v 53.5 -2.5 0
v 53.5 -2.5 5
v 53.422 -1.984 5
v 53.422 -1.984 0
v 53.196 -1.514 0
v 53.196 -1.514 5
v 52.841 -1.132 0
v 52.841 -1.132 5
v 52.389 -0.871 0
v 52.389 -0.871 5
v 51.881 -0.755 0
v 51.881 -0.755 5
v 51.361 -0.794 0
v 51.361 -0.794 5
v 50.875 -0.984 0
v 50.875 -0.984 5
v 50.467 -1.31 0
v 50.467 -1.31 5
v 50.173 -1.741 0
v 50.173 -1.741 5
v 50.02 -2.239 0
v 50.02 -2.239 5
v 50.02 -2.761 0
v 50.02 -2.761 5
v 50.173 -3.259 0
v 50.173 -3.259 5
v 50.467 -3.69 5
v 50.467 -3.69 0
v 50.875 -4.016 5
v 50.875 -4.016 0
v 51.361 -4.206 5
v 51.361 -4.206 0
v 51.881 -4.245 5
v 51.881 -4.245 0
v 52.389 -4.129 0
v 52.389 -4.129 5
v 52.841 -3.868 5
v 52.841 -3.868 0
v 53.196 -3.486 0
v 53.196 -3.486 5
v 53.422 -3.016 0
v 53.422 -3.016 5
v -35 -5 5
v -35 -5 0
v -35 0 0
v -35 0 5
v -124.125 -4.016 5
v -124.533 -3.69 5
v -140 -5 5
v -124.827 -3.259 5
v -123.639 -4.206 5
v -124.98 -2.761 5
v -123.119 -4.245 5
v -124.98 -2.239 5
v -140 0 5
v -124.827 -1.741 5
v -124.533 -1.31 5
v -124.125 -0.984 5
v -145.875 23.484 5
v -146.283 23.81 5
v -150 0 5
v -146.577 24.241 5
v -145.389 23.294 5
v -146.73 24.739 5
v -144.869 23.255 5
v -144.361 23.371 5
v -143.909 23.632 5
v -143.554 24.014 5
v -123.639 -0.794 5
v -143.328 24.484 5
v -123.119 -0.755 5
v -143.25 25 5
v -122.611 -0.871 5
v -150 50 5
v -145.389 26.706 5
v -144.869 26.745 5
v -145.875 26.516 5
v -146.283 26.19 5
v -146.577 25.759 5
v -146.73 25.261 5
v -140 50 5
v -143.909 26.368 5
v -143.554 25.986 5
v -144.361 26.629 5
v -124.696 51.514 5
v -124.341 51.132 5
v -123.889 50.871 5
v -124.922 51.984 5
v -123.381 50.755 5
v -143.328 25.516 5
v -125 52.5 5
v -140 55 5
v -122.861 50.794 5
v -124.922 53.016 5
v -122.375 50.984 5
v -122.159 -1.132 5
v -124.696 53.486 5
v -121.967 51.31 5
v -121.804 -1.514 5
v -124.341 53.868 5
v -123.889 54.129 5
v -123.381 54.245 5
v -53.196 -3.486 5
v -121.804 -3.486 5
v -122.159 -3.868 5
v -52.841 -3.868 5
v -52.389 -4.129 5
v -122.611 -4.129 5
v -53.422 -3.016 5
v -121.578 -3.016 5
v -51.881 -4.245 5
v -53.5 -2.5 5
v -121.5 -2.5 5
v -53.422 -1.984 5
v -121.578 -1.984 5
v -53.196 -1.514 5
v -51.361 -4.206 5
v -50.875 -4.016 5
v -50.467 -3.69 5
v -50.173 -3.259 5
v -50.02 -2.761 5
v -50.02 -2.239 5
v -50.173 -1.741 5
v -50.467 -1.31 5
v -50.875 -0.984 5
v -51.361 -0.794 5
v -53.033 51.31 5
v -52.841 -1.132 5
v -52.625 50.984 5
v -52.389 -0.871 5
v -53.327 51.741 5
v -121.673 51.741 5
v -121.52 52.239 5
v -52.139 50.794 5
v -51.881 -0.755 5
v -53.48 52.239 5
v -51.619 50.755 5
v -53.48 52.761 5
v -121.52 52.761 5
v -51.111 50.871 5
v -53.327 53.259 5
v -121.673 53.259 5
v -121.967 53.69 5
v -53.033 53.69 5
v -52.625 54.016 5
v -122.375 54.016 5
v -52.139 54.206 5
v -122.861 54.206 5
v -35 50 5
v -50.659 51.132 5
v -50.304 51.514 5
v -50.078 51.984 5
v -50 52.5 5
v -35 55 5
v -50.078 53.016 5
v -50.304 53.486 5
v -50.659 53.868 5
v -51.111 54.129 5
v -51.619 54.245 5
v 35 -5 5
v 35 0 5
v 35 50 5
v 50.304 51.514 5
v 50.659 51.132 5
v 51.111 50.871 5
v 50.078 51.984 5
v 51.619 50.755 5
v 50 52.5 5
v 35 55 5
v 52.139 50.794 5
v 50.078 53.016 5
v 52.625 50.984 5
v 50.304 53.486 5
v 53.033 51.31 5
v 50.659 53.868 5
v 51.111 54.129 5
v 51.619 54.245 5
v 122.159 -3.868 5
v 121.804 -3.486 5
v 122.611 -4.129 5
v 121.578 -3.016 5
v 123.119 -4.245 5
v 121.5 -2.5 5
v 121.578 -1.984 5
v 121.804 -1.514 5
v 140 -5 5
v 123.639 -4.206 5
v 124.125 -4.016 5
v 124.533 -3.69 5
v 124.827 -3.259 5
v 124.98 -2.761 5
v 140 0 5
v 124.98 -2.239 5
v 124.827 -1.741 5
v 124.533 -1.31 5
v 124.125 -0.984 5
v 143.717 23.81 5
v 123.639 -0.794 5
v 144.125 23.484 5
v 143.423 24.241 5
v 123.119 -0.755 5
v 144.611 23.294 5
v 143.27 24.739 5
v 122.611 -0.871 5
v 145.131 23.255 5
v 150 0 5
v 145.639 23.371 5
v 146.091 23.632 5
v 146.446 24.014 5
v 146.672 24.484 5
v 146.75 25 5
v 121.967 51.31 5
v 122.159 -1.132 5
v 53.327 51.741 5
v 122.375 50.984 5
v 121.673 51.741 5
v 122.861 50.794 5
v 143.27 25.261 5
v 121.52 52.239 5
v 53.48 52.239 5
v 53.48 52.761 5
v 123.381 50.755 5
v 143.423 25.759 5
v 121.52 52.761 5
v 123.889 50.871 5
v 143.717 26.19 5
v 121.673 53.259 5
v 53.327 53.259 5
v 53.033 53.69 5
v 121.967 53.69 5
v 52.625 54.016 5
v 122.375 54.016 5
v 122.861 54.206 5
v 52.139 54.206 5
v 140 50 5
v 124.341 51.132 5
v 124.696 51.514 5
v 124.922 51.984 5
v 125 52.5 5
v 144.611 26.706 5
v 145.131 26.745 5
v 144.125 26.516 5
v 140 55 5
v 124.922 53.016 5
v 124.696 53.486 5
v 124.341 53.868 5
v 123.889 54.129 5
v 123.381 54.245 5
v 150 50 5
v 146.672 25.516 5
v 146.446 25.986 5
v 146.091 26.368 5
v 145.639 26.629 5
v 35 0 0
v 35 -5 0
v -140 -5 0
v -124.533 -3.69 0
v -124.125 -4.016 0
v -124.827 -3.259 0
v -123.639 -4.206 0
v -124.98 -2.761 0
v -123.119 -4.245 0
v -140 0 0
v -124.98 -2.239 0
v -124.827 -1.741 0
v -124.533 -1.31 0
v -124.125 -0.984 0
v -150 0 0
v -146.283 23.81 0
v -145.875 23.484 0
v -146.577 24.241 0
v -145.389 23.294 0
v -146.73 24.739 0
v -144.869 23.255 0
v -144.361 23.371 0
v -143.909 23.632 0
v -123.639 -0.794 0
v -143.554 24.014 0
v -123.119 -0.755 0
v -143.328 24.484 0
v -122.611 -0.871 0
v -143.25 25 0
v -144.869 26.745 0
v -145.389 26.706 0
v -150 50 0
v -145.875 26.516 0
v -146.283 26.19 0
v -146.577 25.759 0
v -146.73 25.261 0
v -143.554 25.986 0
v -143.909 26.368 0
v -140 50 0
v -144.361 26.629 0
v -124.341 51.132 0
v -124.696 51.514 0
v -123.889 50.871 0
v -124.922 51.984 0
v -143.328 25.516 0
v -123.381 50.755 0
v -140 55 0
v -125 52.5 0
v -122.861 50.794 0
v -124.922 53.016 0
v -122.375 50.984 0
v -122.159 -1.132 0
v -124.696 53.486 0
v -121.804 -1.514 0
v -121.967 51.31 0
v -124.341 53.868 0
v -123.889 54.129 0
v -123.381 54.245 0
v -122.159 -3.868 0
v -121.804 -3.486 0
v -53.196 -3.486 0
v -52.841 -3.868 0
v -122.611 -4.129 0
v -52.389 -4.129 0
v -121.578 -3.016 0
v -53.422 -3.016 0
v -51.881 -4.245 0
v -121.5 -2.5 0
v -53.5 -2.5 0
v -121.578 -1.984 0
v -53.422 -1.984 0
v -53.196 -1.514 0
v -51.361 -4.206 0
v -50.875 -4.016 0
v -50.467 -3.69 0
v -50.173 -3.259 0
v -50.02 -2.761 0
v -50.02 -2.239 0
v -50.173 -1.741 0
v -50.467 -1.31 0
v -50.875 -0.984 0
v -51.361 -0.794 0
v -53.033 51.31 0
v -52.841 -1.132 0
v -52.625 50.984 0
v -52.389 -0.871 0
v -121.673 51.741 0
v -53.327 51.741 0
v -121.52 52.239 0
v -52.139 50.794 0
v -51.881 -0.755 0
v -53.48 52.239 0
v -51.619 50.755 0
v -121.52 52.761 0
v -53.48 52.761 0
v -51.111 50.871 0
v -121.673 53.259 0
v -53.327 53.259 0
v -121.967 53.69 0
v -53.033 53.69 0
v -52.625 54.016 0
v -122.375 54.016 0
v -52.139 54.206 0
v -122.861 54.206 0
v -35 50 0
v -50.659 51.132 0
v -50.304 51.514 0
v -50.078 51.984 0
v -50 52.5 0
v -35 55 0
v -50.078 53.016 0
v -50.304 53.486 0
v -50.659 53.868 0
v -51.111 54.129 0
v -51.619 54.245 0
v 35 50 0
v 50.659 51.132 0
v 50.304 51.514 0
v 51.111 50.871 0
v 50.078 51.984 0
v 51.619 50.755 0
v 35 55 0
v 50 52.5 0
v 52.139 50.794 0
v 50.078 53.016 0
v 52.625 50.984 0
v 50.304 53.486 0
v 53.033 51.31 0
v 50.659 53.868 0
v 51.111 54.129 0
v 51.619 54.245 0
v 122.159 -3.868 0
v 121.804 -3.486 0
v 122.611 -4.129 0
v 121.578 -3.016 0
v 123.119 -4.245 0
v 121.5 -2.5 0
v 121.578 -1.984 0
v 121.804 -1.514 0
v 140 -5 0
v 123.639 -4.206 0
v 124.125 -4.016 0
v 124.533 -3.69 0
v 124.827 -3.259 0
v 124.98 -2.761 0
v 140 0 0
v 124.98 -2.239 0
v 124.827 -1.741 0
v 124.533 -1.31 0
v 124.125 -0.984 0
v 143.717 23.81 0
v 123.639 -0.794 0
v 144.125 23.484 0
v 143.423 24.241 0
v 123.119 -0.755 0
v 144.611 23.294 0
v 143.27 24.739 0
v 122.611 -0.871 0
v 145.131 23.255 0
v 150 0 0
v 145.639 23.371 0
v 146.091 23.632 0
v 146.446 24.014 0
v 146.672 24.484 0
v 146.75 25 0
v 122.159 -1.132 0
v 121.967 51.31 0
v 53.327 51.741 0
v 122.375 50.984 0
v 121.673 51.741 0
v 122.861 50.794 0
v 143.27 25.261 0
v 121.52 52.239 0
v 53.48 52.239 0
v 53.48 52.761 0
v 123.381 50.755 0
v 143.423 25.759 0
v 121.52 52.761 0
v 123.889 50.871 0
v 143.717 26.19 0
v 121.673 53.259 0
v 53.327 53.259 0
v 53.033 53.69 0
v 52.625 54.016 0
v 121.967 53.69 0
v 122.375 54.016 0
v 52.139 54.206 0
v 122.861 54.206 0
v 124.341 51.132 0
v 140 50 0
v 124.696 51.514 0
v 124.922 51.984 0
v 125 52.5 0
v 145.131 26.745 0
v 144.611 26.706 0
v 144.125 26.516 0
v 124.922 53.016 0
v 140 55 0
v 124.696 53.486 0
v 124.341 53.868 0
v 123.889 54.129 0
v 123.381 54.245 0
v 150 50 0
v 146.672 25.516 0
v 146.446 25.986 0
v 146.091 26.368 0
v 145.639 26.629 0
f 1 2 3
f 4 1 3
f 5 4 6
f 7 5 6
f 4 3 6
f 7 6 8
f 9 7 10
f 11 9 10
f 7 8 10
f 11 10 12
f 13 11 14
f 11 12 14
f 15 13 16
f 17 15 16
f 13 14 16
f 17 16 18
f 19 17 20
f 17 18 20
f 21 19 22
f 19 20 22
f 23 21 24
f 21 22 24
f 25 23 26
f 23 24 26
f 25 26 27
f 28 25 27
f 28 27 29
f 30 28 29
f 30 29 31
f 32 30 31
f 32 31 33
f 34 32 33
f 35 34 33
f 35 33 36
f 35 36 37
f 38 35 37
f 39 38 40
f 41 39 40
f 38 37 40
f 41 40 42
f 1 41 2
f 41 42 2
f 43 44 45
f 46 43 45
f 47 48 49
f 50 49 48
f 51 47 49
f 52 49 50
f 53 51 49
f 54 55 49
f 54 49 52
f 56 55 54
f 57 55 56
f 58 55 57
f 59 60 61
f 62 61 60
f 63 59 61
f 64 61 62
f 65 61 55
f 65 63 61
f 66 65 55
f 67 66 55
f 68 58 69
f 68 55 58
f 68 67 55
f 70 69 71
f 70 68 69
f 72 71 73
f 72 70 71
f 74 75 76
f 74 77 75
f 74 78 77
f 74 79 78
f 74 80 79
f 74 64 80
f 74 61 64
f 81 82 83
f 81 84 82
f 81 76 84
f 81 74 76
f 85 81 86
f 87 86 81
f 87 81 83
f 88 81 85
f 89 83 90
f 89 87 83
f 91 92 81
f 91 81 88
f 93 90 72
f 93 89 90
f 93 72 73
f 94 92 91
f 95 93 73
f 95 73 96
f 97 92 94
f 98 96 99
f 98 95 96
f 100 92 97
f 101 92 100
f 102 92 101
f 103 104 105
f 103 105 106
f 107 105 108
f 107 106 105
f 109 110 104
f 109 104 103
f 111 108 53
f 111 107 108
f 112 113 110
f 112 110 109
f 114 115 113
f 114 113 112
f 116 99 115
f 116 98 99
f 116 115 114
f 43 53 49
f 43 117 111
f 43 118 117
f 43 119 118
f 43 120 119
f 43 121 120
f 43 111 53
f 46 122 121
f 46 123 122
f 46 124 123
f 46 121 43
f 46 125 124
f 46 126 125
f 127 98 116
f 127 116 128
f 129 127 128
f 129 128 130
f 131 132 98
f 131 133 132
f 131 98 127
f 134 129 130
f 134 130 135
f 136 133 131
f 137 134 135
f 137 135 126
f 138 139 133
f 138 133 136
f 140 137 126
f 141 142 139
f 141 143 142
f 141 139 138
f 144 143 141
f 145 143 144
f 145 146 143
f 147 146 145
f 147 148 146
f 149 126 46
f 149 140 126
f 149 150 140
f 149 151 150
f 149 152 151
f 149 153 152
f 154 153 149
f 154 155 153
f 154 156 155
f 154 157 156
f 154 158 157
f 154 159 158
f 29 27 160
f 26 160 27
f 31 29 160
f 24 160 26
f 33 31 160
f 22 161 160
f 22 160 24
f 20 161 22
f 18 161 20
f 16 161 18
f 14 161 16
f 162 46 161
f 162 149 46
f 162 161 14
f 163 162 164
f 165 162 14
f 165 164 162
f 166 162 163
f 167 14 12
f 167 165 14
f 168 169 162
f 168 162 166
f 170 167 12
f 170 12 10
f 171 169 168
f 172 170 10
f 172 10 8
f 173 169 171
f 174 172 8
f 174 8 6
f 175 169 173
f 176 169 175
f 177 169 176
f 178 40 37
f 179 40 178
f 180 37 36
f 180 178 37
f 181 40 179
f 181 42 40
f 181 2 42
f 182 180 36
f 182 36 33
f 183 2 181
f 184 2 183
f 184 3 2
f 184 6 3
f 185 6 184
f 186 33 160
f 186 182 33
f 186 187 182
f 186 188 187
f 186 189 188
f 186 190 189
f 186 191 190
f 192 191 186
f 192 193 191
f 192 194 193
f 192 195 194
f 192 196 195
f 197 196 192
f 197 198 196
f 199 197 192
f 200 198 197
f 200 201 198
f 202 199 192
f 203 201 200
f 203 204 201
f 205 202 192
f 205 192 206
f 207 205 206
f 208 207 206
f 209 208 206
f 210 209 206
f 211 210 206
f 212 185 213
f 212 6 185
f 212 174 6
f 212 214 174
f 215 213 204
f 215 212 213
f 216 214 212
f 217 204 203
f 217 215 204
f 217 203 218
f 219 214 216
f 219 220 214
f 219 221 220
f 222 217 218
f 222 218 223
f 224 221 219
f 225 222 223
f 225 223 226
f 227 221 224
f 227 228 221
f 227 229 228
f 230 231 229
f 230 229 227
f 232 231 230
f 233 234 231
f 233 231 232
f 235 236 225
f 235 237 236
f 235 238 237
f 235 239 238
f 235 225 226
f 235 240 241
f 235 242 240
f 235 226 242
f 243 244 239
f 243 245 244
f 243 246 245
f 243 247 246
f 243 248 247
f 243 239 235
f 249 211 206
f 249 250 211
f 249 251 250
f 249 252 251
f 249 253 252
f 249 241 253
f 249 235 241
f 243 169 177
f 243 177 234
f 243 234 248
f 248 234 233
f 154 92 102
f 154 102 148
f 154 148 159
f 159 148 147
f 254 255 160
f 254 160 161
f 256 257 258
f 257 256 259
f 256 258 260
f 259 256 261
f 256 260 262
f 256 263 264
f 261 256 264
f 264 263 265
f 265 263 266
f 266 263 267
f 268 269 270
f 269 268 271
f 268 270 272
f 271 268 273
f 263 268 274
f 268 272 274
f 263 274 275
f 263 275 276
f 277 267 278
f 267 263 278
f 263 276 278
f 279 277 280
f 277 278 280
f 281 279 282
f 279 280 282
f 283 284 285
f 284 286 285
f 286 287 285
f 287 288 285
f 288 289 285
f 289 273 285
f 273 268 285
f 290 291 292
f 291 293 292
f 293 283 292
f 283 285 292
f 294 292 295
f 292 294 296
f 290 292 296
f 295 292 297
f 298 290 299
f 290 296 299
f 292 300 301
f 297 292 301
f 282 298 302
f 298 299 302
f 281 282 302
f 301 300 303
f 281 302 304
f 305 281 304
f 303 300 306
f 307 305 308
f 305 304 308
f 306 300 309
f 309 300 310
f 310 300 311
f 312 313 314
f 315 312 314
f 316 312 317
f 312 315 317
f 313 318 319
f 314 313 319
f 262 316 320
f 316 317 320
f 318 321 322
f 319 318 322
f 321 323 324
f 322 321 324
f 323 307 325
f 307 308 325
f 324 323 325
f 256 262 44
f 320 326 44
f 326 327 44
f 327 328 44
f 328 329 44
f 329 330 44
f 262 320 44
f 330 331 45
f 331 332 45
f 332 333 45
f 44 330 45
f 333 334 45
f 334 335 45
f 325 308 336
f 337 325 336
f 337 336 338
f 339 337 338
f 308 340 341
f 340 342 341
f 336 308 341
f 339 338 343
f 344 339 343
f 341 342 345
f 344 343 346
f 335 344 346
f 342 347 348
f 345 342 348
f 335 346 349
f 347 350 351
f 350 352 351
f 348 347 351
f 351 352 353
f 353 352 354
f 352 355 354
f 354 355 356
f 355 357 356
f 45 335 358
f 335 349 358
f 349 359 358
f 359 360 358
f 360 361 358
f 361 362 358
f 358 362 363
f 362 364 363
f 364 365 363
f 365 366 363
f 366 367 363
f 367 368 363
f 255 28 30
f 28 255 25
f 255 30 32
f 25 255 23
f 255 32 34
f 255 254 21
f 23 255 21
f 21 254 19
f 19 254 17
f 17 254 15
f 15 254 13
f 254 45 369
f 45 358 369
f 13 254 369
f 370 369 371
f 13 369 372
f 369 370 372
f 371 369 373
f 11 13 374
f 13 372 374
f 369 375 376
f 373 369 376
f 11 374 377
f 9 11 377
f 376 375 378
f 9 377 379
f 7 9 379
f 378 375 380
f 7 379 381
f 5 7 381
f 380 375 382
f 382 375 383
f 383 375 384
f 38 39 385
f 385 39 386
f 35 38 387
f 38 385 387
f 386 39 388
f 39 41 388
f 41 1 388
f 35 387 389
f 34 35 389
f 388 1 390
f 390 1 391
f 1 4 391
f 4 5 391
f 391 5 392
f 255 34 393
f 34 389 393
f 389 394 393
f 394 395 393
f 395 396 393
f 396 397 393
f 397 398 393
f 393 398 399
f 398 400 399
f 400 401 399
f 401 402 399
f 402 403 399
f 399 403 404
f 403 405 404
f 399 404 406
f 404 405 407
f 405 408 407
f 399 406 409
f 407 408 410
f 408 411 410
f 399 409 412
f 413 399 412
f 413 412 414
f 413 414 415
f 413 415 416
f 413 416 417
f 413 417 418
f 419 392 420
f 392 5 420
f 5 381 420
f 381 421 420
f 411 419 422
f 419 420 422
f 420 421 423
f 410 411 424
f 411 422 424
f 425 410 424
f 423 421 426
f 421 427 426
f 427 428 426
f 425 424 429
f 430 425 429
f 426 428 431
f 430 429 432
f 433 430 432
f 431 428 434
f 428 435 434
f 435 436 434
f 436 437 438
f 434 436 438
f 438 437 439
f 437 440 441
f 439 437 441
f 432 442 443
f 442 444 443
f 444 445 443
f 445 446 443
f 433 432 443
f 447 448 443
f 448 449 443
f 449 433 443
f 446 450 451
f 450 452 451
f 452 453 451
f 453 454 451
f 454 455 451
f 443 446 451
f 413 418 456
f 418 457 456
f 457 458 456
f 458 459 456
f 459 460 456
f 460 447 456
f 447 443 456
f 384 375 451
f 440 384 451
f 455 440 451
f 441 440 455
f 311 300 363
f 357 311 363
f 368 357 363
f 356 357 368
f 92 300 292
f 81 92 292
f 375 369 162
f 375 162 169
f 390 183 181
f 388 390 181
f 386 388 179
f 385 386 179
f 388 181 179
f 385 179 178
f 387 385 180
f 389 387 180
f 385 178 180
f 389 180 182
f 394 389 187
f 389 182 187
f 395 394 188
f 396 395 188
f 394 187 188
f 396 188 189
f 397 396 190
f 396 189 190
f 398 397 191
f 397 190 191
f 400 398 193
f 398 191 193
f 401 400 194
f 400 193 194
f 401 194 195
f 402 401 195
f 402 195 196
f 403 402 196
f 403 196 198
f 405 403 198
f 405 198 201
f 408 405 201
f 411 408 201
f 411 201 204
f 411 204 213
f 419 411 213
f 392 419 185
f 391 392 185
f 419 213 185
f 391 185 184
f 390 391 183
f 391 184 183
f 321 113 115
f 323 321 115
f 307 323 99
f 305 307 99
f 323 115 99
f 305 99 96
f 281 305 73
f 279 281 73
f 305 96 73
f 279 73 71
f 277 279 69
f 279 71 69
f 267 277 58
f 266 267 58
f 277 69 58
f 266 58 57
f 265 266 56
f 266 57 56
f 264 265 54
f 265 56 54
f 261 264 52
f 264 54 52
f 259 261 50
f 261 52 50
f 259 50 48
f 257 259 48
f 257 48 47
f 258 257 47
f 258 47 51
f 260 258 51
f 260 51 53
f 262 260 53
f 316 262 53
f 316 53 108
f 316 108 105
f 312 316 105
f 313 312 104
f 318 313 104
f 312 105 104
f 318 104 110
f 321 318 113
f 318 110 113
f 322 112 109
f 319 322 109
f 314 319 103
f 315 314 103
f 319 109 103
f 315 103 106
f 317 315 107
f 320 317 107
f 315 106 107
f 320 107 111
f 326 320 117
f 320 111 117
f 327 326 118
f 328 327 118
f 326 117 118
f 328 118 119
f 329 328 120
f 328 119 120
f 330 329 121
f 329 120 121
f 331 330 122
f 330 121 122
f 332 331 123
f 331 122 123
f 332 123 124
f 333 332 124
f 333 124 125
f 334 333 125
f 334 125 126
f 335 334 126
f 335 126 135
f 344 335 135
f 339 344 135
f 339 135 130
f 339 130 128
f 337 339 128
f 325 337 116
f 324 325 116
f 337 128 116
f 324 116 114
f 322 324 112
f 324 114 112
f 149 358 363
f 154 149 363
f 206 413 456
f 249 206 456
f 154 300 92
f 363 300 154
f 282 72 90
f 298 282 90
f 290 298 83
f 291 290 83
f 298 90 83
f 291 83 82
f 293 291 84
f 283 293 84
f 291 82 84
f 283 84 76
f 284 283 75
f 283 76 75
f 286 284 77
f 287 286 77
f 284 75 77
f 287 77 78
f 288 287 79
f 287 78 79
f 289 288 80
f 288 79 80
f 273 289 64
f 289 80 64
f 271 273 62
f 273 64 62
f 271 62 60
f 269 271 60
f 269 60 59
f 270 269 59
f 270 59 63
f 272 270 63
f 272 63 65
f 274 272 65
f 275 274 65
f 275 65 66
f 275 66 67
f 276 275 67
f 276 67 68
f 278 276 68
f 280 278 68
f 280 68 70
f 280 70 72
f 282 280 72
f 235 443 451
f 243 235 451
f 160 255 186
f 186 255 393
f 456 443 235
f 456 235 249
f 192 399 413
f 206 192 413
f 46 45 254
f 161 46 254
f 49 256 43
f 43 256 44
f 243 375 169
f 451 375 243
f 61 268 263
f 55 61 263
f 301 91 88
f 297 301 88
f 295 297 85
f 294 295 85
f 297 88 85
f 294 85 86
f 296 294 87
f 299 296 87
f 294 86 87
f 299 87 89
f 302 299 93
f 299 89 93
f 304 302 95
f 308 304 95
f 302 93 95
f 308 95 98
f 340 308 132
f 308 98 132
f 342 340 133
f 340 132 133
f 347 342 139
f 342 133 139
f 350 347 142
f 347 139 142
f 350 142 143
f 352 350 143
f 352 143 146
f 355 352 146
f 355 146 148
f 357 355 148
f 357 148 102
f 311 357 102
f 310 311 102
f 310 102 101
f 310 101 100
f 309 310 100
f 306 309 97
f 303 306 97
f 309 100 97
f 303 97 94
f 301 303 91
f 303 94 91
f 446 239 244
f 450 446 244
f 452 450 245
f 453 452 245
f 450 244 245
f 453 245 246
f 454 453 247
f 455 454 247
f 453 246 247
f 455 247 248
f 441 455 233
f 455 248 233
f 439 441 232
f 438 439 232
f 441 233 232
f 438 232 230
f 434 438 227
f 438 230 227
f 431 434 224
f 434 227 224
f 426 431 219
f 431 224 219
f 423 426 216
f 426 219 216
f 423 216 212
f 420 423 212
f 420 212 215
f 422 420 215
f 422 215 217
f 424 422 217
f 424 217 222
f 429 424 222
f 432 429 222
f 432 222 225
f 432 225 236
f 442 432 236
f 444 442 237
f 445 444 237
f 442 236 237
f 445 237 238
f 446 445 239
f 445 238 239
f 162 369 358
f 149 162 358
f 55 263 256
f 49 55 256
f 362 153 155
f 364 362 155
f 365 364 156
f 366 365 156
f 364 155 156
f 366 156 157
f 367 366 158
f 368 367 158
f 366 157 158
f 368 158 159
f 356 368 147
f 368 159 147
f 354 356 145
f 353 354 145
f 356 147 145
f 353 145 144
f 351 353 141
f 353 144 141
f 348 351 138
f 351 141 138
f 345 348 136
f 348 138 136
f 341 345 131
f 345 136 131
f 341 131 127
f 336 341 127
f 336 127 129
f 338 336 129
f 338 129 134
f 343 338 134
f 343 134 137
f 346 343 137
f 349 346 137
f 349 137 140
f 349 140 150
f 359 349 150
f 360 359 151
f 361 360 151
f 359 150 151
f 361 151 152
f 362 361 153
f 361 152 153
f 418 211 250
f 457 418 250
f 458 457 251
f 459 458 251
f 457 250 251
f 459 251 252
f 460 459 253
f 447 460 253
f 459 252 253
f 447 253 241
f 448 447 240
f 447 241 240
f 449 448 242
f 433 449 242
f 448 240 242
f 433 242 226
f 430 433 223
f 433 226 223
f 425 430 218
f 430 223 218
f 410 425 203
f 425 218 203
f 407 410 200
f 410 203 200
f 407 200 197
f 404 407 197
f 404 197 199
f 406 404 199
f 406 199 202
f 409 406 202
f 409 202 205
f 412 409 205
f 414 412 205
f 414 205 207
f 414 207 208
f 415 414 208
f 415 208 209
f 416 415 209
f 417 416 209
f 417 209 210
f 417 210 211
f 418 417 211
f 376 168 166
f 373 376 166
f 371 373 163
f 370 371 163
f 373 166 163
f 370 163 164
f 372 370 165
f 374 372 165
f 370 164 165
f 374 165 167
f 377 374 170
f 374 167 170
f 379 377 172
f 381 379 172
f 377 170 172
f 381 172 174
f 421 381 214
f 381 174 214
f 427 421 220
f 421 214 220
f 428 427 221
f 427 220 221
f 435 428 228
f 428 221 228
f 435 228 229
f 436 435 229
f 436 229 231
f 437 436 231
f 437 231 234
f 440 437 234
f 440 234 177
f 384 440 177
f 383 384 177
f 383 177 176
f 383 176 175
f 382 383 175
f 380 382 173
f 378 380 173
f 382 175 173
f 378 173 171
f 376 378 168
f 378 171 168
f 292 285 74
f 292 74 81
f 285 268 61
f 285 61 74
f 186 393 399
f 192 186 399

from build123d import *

# Parameters (mm, degrees)
SKETCH1_W           = 105
SKETCH1_H           = 5
SKETCH1_W_2         = 10
SKETCH1_H_2         = 50
BOSS_EXTRUDE1_DEPTH = 5
SKETCH2_R           = 1.75
CUT_EXTRUDE1_DEPTH  = 5
SKETCH3_R           = 1.75
CUT_EXTRUDE2_DEPTH  = 10


with BuildPart() as part:
    # Sketch1 → Boss-Extrude1 (new body)
    with BuildSketch(Plane.XY):
        Polygon((-35, 0), (0, 0), (0, 50), (-35, 50), (-140, 50), (-140, 0), align=None)
        Polygon((0, 50), (0, 0), (35, 0), (140, 0), (140, 50), (35, 50), align=None)
        with Locations((-87.5, -2.5)):
            Rectangle(SKETCH1_W, SKETCH1_H)
        with Locations((87.5, -2.5)):
            Rectangle(SKETCH1_W, SKETCH1_H)
        with Locations((-87.5, 52.5)):
            Rectangle(SKETCH1_W, SKETCH1_H)
        with Locations((87.5, 52.5)):
            Rectangle(SKETCH1_W, SKETCH1_H)
        with Locations((-145, 25)):
            Rectangle(SKETCH1_W_2, SKETCH1_H_2)
        with Locations((145, 25)):
            Rectangle(SKETCH1_W_2, SKETCH1_H_2)
    extrude(amount=BOSS_EXTRUDE1_DEPTH)

    # Sketch2 → Cut-Extrude1 (cut)
    with BuildSketch(Plane.XY.offset(5)):
        with Locations((-123.25, -2.5)):
            Circle(SKETCH2_R)
        with Locations(Location((-51.75, -2.5, 0), (0, 0, 180))):
            Circle(SKETCH2_R)
        with Locations((51.75, -2.5)):
            Circle(SKETCH2_R)
        with Locations(Location((123.25, -2.5, 0), (0, 0, 180))):
            Circle(SKETCH2_R)
        with Locations((123.25, 52.5)):
            Circle(SKETCH2_R)
        with Locations(Location((51.75, 52.5, 0), (0, 0, 180))):
            Circle(SKETCH2_R)
        with Locations((-51.75, 52.5)):
            Circle(SKETCH2_R)
        with Locations(Location((-123.25, 52.5, 0), (0, 0, 180))):
            Circle(SKETCH2_R)
    extrude(amount=-CUT_EXTRUDE1_DEPTH, mode=Mode.SUBTRACT)

    # Sketch3 → Cut-Extrude2 (cut)
    with BuildSketch(Plane.XY.offset(5)):
        with Locations((-145, 25)):
            Circle(SKETCH3_R)
        with Locations((145, 25)):
            Circle(SKETCH3_R)
    extrude(amount=-CUT_EXTRUDE2_DEPTH, mode=Mode.SUBTRACT)


solid = part.part
